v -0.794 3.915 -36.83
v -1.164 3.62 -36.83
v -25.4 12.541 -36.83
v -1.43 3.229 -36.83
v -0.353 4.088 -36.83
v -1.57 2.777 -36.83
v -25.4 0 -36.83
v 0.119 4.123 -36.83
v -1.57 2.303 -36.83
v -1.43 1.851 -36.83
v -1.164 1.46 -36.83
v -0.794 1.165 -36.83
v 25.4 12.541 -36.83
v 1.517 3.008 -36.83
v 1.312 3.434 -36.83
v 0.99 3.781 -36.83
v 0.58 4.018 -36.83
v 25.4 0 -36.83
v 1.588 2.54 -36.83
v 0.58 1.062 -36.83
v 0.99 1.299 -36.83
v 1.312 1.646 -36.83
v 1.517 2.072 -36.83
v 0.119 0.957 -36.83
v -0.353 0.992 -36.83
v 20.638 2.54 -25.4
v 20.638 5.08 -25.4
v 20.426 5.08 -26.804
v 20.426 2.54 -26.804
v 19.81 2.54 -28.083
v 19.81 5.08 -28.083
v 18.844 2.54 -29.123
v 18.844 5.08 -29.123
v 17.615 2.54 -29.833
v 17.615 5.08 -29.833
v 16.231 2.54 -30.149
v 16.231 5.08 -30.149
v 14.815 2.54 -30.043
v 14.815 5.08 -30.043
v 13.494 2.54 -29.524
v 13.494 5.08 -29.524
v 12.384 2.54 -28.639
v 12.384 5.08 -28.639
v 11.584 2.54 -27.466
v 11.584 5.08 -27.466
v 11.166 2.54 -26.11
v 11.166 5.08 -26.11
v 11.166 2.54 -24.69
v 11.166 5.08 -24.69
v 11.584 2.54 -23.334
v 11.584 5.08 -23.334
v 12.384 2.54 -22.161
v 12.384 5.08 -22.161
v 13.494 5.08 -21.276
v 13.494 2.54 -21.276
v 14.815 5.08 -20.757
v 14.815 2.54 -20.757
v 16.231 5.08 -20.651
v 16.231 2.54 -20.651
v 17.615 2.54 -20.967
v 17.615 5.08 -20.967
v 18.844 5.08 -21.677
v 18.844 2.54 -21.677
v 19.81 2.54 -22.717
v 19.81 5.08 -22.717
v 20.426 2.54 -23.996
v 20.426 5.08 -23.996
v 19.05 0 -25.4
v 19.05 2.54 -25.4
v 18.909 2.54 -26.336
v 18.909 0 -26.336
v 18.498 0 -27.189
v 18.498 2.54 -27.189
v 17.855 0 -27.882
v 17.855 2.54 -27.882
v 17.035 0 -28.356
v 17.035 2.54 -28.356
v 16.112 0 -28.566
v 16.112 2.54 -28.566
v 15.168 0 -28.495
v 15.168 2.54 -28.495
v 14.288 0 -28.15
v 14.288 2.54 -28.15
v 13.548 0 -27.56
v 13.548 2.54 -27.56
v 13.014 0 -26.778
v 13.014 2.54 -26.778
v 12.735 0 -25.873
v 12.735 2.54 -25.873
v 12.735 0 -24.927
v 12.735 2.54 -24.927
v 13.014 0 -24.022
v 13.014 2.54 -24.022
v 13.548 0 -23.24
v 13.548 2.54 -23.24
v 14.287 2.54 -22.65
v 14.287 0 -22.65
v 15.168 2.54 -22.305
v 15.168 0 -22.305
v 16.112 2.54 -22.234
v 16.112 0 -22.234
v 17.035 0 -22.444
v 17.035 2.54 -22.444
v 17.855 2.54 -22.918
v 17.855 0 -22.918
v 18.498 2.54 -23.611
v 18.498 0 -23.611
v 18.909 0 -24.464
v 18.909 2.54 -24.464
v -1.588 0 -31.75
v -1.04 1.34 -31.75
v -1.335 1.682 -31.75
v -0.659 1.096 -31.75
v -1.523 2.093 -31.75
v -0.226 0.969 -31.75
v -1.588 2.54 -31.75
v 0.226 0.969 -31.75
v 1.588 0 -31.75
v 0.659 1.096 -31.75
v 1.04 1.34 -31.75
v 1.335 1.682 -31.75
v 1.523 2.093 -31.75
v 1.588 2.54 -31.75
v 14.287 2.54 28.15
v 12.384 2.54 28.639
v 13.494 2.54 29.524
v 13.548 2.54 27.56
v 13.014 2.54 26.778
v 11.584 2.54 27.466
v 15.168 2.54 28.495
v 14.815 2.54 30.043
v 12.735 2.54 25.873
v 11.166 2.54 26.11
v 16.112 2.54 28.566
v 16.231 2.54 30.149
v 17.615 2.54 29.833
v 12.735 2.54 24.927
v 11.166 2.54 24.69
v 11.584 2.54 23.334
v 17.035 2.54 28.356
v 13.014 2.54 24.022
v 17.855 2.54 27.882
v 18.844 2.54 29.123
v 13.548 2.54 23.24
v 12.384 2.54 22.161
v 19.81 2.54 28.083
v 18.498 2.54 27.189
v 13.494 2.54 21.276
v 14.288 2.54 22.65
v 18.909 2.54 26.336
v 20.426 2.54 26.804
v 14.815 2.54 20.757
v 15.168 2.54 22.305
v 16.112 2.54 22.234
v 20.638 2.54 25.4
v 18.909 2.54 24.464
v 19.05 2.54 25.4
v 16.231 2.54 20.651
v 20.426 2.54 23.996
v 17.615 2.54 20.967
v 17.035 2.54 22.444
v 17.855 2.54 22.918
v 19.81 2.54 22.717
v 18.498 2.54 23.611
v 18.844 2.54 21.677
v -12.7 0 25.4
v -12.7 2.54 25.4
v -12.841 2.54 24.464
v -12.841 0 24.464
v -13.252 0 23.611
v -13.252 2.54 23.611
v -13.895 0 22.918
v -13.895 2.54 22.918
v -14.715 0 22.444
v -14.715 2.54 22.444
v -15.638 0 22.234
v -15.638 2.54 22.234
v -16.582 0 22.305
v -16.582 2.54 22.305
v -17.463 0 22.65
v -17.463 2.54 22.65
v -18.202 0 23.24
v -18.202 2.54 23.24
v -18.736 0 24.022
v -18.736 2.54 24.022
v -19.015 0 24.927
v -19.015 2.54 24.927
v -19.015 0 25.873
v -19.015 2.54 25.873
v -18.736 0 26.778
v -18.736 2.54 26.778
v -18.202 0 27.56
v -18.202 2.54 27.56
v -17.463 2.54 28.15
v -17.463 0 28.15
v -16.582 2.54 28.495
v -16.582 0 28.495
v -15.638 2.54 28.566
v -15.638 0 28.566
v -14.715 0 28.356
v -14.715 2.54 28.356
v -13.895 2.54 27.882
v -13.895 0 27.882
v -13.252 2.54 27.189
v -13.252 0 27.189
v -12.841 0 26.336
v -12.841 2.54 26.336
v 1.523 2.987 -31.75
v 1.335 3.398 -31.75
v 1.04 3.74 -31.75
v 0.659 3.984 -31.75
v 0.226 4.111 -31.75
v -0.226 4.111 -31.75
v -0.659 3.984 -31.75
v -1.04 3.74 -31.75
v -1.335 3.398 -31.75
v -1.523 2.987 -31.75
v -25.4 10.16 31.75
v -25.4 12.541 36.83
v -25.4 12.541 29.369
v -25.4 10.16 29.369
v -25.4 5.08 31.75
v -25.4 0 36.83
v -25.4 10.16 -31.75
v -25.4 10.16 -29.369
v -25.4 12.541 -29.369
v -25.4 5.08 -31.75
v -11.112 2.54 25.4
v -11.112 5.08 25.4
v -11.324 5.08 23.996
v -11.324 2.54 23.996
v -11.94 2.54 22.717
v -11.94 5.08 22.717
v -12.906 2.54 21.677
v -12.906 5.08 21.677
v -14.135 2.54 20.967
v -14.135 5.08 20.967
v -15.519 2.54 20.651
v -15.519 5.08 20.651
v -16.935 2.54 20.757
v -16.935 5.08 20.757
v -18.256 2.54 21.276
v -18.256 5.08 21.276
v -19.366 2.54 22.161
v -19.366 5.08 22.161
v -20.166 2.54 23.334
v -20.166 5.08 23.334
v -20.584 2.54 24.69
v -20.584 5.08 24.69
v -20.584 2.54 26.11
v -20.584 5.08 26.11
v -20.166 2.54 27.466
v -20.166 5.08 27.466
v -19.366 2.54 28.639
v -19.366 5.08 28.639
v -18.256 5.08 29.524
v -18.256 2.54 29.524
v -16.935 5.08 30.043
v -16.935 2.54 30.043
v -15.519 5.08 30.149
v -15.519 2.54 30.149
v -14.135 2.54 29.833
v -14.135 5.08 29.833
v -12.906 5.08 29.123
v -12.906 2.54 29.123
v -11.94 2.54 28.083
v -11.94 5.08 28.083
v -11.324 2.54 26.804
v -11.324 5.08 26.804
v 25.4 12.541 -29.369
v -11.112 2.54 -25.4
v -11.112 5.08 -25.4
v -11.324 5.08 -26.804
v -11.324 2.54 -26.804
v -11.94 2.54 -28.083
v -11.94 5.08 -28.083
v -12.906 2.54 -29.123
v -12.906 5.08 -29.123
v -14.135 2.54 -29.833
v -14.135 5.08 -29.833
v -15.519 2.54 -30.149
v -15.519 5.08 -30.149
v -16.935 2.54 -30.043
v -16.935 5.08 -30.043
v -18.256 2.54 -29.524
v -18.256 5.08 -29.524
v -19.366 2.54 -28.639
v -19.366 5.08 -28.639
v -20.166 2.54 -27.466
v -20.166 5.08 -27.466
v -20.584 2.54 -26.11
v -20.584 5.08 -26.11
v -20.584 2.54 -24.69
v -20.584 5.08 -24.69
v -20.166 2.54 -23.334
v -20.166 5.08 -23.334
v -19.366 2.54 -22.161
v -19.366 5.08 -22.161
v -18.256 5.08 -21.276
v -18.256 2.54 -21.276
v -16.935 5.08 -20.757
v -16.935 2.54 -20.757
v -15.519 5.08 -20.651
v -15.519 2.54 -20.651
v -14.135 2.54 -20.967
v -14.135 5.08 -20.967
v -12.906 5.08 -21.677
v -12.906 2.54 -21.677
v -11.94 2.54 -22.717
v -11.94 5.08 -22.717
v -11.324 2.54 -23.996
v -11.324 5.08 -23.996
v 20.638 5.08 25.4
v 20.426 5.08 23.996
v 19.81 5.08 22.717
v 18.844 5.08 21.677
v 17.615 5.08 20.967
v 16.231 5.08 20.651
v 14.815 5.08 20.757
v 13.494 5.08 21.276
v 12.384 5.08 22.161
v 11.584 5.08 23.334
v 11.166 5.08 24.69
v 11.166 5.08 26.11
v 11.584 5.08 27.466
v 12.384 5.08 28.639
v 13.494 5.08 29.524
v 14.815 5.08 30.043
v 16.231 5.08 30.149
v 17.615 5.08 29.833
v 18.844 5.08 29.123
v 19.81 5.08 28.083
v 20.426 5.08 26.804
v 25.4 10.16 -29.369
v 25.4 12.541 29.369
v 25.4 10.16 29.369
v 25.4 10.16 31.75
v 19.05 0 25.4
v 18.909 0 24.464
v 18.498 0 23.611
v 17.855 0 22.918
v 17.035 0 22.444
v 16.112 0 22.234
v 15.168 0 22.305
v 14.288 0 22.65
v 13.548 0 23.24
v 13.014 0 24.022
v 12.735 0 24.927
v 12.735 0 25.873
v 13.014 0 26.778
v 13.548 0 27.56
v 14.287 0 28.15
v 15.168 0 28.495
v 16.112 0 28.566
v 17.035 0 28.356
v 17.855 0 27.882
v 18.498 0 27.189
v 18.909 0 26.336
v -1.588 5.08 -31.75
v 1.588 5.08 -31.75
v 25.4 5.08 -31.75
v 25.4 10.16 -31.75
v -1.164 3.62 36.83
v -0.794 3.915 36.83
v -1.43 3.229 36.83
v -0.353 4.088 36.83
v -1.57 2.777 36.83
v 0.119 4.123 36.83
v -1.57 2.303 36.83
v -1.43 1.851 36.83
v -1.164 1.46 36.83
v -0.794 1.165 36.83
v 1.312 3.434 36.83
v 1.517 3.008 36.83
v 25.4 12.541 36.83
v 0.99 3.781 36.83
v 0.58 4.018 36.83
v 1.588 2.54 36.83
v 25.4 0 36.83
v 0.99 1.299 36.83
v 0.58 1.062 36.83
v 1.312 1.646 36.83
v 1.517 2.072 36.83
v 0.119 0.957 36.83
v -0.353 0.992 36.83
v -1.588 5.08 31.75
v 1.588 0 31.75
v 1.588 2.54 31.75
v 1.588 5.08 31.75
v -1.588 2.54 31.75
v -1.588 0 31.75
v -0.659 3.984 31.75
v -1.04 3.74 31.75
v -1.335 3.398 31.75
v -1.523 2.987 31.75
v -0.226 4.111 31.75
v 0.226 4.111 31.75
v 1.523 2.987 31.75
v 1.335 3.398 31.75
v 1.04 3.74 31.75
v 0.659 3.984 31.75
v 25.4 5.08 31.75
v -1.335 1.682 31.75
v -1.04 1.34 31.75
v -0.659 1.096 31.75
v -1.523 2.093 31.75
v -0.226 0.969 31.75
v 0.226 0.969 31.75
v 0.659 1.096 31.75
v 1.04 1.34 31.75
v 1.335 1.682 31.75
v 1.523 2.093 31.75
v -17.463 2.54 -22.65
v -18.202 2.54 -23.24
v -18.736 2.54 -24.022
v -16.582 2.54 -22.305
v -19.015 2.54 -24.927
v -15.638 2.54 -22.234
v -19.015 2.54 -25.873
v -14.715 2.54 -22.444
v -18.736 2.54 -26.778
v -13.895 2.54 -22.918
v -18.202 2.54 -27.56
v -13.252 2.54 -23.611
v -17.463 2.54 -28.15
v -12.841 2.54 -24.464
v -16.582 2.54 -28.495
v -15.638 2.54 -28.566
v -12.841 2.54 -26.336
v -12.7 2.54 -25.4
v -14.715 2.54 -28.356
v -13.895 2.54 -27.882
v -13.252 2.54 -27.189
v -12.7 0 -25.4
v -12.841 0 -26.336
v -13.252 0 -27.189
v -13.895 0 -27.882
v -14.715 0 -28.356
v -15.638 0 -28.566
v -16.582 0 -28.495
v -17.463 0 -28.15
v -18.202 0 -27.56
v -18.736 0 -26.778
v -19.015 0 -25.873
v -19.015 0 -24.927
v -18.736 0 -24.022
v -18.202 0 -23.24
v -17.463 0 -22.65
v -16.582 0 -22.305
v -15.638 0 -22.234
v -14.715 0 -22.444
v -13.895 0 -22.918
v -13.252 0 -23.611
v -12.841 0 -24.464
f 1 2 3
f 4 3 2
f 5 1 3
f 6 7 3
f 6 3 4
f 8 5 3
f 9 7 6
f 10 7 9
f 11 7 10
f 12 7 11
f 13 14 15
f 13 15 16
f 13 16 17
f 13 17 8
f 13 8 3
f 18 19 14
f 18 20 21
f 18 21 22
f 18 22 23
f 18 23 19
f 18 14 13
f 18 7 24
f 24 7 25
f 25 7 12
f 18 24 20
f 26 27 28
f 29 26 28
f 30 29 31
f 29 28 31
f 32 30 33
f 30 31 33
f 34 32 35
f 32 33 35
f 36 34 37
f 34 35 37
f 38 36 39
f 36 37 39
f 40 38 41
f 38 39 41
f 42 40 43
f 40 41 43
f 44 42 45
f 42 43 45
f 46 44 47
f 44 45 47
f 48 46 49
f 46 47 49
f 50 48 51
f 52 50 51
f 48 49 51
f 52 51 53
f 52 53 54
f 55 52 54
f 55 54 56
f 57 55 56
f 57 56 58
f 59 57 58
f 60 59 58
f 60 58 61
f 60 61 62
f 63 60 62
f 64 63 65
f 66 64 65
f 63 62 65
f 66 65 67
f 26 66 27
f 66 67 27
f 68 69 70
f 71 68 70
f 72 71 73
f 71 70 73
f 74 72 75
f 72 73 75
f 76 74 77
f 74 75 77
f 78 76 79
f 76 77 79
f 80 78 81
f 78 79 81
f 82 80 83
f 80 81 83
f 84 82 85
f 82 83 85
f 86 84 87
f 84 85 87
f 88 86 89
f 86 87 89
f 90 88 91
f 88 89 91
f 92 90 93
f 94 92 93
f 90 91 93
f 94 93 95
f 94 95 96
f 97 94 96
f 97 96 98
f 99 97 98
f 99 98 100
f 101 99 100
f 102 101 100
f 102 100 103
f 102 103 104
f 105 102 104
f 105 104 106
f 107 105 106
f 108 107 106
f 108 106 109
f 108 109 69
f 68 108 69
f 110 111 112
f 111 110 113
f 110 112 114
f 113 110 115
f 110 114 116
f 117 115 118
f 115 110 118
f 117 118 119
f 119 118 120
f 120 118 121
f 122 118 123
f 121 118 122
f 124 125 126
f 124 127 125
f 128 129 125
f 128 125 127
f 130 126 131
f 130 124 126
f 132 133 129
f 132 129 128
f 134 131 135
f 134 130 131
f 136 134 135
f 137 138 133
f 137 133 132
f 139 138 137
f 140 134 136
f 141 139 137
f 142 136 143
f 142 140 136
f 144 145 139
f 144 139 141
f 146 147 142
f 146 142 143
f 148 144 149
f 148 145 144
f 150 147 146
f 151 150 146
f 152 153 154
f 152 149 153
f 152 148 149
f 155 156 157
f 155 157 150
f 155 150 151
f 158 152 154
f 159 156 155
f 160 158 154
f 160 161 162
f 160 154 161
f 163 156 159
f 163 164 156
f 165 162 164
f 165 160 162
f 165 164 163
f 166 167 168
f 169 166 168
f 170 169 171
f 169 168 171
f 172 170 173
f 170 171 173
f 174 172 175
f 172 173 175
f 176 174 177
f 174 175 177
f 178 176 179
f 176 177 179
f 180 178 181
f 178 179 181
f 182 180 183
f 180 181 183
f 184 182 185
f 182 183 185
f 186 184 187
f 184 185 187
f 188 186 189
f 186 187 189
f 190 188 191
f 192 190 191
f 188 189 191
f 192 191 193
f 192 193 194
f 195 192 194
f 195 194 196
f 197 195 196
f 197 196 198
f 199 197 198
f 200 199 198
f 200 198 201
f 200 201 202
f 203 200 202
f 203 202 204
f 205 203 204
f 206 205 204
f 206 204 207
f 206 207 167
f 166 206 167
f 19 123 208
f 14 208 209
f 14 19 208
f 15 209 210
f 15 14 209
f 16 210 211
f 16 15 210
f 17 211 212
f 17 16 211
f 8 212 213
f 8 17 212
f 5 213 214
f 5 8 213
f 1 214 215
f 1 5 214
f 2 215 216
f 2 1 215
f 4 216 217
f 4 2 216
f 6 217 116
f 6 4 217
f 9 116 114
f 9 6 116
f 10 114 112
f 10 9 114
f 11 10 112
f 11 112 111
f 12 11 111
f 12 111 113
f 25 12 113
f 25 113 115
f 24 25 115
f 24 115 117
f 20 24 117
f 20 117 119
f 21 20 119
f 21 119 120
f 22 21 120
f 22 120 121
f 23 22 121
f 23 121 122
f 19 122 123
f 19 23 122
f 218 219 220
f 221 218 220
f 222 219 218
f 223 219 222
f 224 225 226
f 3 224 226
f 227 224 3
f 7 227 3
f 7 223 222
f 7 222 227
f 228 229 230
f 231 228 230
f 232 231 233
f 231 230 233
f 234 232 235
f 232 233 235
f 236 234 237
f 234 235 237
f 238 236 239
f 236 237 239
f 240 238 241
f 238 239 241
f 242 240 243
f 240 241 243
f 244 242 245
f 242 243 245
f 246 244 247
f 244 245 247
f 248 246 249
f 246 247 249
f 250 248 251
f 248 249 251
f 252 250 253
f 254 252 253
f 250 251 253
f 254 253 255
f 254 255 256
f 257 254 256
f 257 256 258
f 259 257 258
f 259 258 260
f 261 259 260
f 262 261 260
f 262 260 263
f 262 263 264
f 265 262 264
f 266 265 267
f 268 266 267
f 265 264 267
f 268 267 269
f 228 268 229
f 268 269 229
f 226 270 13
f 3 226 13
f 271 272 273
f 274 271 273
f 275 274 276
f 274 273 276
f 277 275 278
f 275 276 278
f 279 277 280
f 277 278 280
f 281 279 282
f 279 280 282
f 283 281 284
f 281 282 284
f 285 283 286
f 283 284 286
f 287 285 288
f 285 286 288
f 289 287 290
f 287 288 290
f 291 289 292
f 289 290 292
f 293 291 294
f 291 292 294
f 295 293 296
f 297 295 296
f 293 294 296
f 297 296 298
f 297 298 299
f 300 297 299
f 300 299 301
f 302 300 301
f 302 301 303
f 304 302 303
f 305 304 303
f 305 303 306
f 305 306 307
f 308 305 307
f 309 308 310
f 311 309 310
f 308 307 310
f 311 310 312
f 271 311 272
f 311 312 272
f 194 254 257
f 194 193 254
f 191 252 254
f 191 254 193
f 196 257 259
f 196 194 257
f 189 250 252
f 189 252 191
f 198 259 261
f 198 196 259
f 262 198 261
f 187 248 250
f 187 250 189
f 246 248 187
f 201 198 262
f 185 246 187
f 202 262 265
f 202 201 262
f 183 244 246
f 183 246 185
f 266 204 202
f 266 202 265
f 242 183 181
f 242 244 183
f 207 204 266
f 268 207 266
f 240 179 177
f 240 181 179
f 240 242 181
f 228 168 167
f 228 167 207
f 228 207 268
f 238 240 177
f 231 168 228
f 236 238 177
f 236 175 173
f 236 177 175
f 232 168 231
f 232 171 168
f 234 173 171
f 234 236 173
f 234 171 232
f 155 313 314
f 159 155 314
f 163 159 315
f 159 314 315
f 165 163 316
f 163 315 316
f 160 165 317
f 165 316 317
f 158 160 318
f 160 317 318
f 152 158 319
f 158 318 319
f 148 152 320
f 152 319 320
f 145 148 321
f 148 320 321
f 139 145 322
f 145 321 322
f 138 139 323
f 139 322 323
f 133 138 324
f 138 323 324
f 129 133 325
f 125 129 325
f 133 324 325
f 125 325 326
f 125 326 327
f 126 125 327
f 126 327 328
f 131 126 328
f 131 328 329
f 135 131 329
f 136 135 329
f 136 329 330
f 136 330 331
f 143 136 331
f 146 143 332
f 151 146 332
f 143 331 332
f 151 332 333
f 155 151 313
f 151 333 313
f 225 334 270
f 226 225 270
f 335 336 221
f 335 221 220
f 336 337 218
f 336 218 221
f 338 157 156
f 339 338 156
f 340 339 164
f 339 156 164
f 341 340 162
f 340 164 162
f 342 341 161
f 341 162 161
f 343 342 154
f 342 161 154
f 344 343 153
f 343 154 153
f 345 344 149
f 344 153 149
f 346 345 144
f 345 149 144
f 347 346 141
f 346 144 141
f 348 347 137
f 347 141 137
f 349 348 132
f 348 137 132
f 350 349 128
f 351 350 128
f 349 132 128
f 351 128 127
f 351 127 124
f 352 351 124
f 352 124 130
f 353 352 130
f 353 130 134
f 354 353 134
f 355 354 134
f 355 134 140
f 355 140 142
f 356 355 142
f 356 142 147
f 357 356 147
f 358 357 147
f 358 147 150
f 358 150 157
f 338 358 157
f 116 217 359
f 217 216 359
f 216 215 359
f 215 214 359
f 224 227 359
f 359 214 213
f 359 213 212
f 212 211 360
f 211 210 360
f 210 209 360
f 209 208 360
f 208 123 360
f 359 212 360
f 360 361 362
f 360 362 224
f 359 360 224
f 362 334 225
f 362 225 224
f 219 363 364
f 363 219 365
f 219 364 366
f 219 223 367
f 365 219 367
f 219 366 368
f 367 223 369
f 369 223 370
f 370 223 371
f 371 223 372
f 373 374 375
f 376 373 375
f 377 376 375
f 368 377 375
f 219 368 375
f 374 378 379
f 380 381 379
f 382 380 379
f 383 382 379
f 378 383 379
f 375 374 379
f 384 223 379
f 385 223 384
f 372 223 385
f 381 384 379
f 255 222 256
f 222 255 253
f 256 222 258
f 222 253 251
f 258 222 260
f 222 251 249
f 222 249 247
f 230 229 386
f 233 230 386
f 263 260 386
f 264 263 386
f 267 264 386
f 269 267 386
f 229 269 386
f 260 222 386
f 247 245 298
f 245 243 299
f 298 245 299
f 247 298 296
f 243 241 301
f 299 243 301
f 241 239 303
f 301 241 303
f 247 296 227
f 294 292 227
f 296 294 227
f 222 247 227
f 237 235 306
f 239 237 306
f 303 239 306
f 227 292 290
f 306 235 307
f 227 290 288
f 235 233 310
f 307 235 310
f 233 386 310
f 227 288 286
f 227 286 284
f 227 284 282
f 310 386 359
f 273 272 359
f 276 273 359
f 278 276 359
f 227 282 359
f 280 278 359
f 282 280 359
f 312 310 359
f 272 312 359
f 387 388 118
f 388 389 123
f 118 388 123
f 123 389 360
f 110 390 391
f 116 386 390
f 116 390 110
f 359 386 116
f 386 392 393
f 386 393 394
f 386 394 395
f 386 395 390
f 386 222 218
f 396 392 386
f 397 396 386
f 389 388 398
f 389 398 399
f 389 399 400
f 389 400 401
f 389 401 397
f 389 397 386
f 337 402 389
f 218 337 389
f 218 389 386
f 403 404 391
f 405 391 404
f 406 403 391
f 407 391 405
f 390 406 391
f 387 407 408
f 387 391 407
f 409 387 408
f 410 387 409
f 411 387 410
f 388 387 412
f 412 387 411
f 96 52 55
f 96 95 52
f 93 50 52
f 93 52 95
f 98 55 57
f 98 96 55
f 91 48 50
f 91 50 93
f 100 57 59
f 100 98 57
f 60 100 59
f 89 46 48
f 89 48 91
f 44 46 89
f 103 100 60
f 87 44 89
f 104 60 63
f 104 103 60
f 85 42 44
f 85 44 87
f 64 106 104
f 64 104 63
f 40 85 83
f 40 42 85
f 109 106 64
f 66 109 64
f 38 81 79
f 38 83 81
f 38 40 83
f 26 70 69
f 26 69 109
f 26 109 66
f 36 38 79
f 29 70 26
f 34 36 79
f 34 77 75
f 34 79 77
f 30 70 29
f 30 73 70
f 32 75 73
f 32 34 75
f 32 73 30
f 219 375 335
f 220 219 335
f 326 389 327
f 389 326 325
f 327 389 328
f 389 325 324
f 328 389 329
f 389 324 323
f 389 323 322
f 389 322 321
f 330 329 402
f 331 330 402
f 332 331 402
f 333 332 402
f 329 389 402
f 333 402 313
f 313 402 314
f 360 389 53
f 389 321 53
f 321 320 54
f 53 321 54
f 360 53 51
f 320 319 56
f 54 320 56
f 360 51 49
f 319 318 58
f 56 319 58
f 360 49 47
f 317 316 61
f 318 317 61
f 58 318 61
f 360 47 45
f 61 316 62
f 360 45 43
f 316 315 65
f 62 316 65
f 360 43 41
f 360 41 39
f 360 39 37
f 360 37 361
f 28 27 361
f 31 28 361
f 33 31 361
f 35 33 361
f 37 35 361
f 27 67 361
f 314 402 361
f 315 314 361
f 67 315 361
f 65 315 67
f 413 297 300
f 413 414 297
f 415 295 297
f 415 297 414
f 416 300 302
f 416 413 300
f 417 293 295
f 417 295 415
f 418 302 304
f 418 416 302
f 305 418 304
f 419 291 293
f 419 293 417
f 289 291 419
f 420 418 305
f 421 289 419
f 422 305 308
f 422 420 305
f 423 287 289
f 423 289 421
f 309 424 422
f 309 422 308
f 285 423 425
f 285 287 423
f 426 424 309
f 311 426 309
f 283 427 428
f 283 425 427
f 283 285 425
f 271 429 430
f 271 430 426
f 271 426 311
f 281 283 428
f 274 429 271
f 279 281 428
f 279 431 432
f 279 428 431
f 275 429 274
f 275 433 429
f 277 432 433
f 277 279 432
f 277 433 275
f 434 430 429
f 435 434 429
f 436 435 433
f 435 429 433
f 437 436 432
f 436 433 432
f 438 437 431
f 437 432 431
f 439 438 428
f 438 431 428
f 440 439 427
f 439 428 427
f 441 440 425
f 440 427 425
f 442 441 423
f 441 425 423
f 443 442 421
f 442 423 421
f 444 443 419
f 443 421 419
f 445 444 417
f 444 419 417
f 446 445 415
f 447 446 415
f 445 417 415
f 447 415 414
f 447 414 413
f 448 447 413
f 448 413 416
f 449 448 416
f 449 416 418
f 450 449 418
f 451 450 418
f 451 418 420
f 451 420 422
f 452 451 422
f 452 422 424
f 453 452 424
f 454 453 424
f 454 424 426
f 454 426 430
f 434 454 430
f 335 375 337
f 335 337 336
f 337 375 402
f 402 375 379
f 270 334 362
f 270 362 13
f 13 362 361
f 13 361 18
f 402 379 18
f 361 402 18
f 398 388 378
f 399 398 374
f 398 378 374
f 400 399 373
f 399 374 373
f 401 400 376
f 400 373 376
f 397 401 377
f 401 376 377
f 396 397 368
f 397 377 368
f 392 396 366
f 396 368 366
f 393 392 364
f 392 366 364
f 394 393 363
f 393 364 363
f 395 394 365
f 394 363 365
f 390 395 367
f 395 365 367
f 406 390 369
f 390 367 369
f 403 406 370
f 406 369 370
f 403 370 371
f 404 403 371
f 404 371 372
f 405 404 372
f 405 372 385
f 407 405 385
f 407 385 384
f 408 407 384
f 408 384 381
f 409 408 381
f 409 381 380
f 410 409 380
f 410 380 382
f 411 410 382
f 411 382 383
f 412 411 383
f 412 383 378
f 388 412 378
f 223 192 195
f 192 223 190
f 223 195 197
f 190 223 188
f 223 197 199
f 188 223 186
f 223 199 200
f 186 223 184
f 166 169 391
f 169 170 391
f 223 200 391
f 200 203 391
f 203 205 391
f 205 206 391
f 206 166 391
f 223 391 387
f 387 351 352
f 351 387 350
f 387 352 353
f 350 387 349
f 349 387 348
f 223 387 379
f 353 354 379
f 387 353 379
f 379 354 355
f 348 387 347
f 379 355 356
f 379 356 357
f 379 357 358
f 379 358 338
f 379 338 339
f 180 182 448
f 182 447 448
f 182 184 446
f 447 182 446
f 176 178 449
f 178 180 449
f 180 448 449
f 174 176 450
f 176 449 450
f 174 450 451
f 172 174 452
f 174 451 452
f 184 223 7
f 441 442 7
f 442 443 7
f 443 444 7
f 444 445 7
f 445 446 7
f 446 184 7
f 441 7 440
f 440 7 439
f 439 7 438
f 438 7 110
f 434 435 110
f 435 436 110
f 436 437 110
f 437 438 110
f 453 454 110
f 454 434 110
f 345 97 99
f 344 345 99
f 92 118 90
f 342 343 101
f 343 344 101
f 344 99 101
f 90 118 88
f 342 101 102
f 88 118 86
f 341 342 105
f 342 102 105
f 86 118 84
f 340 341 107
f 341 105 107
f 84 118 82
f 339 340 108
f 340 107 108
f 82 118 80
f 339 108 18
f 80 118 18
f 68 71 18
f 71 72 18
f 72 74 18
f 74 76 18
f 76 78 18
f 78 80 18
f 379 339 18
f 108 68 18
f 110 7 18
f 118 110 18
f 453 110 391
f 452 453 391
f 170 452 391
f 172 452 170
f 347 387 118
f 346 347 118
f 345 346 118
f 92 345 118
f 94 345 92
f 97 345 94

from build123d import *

# Parameters (mm, degrees)
SKETCH1_W           = 50.8
SKETCH1_H           = 73.66
BOSS_EXTRUDE1_DEPTH = 25.4
SKETCH4_W           = 63.5
SKETCH4_H           = 5.08
SKETCH4_W_2         = 58.7375
SKETCH4_H_2         = 2.38125
CUT_EXTRUDE3_DEPTH  = 51.8
SKETCH5_W           = 73.66
SKETCH5_H           = 12.85875
CUT_EXTRUDE4_DEPTH  = 51.8
SKETCH6_W           = 3.175
SKETCH6_H           = 63.5
CUT_EXTRUDE5_DEPTH  = 6.08
SKETCH7_R           = 3.175
CUT_EXTRUDE6_DEPTH  = 6.08
SKETCH8_R           = 4.7625
CUT_EXTRUDE7_DEPTH  = 2.54
SKETCH9_R           = 1.5875
CUT_EXTRUDE8_DEPTH  = 68.58


with BuildPart() as part:
    # Sketch1 → Boss-Extrude1 (new body)
    with BuildSketch(Plane(origin=(0, 0, 0), x_dir=(1, 0, 0), z_dir=(0, 1, 0))):
        Rectangle(SKETCH1_W, SKETCH1_H)
    extrude(amount=BOSS_EXTRUDE1_DEPTH)

    # Sketch4 → Cut-Extrude3 (cut, through all)
    with BuildSketch(Plane(origin=(25.4, 0, 0), x_dir=(0, 0, -1), z_dir=(1, 0, 0))):
        with Locations((0, 7.62)):
            Rectangle(SKETCH4_W, SKETCH4_H)
        with Locations((0, 11.350625)):
            Rectangle(SKETCH4_W_2, SKETCH4_H_2)
    extrude(amount=-CUT_EXTRUDE3_DEPTH, mode=Mode.SUBTRACT)

    # Sketch5 → Cut-Extrude4 (cut, through all)
    with BuildSketch(Plane(origin=(25.4, 0, 0), x_dir=(0, 0, -1), z_dir=(1, 0, 0))):
        with Locations((0, 18.970625)):
            Rectangle(SKETCH5_W, SKETCH5_H)
    extrude(amount=-CUT_EXTRUDE4_DEPTH, mode=Mode.SUBTRACT)

    # Sketch6 → Cut-Extrude5 (cut, through all)
    with BuildSketch(Plane(origin=(0, 5.08, 0), x_dir=(1, 0, 0), z_dir=(0, 1, 0))):
        Rectangle(SKETCH6_W, SKETCH6_H)
    extrude(amount=-CUT_EXTRUDE5_DEPTH, mode=Mode.SUBTRACT)

    # Sketch7 → Cut-Extrude6 (cut, through all)
    with BuildSketch(Plane(origin=(0, 5.08, 0), x_dir=(1, 0, 0), z_dir=(0, 1, 0))):
        with Locations((15.875, 25.4)):
            Circle(SKETCH7_R)
        with Locations((-15.875, 25.4)):
            Circle(SKETCH7_R)
        with Locations((-15.875, -25.4)):
            Circle(SKETCH7_R)
        with Locations((15.875, -25.4)):
            Circle(SKETCH7_R)
    extrude(amount=-CUT_EXTRUDE6_DEPTH, mode=Mode.SUBTRACT)

    # Sketch8 → Cut-Extrude7 (cut)
    with BuildSketch(Plane(origin=(0, 5.08, 0), x_dir=(1, 0, 0), z_dir=(0, 1, 0))):
        with Locations((-15.875, 25.4)):
            Circle(SKETCH8_R)
        with Locations((-15.875, -25.4)):
            Circle(SKETCH8_R)
        with Locations((15.875, -25.4)):
            Circle(SKETCH8_R)
        with Locations((15.875, 25.4)):
            Circle(SKETCH8_R)
    extrude(amount=-CUT_EXTRUDE7_DEPTH, mode=Mode.SUBTRACT)

    # Sketch9 → Cut-Extrude8 (cut)
    with BuildSketch(Plane.XY.offset(36.83)):
        with Locations((0, 2.54)):
            Circle(SKETCH9_R)
    cut_extrude8 = extrude(amount=-CUT_EXTRUDE8_DEPTH, mode=Mode.SUBTRACT)

    # Mirror1: Cut-Extrude8 across plane
    add(cut_extrude8.mirror(Plane.XY), mode=Mode.SUBTRACT)


solid = part.part
